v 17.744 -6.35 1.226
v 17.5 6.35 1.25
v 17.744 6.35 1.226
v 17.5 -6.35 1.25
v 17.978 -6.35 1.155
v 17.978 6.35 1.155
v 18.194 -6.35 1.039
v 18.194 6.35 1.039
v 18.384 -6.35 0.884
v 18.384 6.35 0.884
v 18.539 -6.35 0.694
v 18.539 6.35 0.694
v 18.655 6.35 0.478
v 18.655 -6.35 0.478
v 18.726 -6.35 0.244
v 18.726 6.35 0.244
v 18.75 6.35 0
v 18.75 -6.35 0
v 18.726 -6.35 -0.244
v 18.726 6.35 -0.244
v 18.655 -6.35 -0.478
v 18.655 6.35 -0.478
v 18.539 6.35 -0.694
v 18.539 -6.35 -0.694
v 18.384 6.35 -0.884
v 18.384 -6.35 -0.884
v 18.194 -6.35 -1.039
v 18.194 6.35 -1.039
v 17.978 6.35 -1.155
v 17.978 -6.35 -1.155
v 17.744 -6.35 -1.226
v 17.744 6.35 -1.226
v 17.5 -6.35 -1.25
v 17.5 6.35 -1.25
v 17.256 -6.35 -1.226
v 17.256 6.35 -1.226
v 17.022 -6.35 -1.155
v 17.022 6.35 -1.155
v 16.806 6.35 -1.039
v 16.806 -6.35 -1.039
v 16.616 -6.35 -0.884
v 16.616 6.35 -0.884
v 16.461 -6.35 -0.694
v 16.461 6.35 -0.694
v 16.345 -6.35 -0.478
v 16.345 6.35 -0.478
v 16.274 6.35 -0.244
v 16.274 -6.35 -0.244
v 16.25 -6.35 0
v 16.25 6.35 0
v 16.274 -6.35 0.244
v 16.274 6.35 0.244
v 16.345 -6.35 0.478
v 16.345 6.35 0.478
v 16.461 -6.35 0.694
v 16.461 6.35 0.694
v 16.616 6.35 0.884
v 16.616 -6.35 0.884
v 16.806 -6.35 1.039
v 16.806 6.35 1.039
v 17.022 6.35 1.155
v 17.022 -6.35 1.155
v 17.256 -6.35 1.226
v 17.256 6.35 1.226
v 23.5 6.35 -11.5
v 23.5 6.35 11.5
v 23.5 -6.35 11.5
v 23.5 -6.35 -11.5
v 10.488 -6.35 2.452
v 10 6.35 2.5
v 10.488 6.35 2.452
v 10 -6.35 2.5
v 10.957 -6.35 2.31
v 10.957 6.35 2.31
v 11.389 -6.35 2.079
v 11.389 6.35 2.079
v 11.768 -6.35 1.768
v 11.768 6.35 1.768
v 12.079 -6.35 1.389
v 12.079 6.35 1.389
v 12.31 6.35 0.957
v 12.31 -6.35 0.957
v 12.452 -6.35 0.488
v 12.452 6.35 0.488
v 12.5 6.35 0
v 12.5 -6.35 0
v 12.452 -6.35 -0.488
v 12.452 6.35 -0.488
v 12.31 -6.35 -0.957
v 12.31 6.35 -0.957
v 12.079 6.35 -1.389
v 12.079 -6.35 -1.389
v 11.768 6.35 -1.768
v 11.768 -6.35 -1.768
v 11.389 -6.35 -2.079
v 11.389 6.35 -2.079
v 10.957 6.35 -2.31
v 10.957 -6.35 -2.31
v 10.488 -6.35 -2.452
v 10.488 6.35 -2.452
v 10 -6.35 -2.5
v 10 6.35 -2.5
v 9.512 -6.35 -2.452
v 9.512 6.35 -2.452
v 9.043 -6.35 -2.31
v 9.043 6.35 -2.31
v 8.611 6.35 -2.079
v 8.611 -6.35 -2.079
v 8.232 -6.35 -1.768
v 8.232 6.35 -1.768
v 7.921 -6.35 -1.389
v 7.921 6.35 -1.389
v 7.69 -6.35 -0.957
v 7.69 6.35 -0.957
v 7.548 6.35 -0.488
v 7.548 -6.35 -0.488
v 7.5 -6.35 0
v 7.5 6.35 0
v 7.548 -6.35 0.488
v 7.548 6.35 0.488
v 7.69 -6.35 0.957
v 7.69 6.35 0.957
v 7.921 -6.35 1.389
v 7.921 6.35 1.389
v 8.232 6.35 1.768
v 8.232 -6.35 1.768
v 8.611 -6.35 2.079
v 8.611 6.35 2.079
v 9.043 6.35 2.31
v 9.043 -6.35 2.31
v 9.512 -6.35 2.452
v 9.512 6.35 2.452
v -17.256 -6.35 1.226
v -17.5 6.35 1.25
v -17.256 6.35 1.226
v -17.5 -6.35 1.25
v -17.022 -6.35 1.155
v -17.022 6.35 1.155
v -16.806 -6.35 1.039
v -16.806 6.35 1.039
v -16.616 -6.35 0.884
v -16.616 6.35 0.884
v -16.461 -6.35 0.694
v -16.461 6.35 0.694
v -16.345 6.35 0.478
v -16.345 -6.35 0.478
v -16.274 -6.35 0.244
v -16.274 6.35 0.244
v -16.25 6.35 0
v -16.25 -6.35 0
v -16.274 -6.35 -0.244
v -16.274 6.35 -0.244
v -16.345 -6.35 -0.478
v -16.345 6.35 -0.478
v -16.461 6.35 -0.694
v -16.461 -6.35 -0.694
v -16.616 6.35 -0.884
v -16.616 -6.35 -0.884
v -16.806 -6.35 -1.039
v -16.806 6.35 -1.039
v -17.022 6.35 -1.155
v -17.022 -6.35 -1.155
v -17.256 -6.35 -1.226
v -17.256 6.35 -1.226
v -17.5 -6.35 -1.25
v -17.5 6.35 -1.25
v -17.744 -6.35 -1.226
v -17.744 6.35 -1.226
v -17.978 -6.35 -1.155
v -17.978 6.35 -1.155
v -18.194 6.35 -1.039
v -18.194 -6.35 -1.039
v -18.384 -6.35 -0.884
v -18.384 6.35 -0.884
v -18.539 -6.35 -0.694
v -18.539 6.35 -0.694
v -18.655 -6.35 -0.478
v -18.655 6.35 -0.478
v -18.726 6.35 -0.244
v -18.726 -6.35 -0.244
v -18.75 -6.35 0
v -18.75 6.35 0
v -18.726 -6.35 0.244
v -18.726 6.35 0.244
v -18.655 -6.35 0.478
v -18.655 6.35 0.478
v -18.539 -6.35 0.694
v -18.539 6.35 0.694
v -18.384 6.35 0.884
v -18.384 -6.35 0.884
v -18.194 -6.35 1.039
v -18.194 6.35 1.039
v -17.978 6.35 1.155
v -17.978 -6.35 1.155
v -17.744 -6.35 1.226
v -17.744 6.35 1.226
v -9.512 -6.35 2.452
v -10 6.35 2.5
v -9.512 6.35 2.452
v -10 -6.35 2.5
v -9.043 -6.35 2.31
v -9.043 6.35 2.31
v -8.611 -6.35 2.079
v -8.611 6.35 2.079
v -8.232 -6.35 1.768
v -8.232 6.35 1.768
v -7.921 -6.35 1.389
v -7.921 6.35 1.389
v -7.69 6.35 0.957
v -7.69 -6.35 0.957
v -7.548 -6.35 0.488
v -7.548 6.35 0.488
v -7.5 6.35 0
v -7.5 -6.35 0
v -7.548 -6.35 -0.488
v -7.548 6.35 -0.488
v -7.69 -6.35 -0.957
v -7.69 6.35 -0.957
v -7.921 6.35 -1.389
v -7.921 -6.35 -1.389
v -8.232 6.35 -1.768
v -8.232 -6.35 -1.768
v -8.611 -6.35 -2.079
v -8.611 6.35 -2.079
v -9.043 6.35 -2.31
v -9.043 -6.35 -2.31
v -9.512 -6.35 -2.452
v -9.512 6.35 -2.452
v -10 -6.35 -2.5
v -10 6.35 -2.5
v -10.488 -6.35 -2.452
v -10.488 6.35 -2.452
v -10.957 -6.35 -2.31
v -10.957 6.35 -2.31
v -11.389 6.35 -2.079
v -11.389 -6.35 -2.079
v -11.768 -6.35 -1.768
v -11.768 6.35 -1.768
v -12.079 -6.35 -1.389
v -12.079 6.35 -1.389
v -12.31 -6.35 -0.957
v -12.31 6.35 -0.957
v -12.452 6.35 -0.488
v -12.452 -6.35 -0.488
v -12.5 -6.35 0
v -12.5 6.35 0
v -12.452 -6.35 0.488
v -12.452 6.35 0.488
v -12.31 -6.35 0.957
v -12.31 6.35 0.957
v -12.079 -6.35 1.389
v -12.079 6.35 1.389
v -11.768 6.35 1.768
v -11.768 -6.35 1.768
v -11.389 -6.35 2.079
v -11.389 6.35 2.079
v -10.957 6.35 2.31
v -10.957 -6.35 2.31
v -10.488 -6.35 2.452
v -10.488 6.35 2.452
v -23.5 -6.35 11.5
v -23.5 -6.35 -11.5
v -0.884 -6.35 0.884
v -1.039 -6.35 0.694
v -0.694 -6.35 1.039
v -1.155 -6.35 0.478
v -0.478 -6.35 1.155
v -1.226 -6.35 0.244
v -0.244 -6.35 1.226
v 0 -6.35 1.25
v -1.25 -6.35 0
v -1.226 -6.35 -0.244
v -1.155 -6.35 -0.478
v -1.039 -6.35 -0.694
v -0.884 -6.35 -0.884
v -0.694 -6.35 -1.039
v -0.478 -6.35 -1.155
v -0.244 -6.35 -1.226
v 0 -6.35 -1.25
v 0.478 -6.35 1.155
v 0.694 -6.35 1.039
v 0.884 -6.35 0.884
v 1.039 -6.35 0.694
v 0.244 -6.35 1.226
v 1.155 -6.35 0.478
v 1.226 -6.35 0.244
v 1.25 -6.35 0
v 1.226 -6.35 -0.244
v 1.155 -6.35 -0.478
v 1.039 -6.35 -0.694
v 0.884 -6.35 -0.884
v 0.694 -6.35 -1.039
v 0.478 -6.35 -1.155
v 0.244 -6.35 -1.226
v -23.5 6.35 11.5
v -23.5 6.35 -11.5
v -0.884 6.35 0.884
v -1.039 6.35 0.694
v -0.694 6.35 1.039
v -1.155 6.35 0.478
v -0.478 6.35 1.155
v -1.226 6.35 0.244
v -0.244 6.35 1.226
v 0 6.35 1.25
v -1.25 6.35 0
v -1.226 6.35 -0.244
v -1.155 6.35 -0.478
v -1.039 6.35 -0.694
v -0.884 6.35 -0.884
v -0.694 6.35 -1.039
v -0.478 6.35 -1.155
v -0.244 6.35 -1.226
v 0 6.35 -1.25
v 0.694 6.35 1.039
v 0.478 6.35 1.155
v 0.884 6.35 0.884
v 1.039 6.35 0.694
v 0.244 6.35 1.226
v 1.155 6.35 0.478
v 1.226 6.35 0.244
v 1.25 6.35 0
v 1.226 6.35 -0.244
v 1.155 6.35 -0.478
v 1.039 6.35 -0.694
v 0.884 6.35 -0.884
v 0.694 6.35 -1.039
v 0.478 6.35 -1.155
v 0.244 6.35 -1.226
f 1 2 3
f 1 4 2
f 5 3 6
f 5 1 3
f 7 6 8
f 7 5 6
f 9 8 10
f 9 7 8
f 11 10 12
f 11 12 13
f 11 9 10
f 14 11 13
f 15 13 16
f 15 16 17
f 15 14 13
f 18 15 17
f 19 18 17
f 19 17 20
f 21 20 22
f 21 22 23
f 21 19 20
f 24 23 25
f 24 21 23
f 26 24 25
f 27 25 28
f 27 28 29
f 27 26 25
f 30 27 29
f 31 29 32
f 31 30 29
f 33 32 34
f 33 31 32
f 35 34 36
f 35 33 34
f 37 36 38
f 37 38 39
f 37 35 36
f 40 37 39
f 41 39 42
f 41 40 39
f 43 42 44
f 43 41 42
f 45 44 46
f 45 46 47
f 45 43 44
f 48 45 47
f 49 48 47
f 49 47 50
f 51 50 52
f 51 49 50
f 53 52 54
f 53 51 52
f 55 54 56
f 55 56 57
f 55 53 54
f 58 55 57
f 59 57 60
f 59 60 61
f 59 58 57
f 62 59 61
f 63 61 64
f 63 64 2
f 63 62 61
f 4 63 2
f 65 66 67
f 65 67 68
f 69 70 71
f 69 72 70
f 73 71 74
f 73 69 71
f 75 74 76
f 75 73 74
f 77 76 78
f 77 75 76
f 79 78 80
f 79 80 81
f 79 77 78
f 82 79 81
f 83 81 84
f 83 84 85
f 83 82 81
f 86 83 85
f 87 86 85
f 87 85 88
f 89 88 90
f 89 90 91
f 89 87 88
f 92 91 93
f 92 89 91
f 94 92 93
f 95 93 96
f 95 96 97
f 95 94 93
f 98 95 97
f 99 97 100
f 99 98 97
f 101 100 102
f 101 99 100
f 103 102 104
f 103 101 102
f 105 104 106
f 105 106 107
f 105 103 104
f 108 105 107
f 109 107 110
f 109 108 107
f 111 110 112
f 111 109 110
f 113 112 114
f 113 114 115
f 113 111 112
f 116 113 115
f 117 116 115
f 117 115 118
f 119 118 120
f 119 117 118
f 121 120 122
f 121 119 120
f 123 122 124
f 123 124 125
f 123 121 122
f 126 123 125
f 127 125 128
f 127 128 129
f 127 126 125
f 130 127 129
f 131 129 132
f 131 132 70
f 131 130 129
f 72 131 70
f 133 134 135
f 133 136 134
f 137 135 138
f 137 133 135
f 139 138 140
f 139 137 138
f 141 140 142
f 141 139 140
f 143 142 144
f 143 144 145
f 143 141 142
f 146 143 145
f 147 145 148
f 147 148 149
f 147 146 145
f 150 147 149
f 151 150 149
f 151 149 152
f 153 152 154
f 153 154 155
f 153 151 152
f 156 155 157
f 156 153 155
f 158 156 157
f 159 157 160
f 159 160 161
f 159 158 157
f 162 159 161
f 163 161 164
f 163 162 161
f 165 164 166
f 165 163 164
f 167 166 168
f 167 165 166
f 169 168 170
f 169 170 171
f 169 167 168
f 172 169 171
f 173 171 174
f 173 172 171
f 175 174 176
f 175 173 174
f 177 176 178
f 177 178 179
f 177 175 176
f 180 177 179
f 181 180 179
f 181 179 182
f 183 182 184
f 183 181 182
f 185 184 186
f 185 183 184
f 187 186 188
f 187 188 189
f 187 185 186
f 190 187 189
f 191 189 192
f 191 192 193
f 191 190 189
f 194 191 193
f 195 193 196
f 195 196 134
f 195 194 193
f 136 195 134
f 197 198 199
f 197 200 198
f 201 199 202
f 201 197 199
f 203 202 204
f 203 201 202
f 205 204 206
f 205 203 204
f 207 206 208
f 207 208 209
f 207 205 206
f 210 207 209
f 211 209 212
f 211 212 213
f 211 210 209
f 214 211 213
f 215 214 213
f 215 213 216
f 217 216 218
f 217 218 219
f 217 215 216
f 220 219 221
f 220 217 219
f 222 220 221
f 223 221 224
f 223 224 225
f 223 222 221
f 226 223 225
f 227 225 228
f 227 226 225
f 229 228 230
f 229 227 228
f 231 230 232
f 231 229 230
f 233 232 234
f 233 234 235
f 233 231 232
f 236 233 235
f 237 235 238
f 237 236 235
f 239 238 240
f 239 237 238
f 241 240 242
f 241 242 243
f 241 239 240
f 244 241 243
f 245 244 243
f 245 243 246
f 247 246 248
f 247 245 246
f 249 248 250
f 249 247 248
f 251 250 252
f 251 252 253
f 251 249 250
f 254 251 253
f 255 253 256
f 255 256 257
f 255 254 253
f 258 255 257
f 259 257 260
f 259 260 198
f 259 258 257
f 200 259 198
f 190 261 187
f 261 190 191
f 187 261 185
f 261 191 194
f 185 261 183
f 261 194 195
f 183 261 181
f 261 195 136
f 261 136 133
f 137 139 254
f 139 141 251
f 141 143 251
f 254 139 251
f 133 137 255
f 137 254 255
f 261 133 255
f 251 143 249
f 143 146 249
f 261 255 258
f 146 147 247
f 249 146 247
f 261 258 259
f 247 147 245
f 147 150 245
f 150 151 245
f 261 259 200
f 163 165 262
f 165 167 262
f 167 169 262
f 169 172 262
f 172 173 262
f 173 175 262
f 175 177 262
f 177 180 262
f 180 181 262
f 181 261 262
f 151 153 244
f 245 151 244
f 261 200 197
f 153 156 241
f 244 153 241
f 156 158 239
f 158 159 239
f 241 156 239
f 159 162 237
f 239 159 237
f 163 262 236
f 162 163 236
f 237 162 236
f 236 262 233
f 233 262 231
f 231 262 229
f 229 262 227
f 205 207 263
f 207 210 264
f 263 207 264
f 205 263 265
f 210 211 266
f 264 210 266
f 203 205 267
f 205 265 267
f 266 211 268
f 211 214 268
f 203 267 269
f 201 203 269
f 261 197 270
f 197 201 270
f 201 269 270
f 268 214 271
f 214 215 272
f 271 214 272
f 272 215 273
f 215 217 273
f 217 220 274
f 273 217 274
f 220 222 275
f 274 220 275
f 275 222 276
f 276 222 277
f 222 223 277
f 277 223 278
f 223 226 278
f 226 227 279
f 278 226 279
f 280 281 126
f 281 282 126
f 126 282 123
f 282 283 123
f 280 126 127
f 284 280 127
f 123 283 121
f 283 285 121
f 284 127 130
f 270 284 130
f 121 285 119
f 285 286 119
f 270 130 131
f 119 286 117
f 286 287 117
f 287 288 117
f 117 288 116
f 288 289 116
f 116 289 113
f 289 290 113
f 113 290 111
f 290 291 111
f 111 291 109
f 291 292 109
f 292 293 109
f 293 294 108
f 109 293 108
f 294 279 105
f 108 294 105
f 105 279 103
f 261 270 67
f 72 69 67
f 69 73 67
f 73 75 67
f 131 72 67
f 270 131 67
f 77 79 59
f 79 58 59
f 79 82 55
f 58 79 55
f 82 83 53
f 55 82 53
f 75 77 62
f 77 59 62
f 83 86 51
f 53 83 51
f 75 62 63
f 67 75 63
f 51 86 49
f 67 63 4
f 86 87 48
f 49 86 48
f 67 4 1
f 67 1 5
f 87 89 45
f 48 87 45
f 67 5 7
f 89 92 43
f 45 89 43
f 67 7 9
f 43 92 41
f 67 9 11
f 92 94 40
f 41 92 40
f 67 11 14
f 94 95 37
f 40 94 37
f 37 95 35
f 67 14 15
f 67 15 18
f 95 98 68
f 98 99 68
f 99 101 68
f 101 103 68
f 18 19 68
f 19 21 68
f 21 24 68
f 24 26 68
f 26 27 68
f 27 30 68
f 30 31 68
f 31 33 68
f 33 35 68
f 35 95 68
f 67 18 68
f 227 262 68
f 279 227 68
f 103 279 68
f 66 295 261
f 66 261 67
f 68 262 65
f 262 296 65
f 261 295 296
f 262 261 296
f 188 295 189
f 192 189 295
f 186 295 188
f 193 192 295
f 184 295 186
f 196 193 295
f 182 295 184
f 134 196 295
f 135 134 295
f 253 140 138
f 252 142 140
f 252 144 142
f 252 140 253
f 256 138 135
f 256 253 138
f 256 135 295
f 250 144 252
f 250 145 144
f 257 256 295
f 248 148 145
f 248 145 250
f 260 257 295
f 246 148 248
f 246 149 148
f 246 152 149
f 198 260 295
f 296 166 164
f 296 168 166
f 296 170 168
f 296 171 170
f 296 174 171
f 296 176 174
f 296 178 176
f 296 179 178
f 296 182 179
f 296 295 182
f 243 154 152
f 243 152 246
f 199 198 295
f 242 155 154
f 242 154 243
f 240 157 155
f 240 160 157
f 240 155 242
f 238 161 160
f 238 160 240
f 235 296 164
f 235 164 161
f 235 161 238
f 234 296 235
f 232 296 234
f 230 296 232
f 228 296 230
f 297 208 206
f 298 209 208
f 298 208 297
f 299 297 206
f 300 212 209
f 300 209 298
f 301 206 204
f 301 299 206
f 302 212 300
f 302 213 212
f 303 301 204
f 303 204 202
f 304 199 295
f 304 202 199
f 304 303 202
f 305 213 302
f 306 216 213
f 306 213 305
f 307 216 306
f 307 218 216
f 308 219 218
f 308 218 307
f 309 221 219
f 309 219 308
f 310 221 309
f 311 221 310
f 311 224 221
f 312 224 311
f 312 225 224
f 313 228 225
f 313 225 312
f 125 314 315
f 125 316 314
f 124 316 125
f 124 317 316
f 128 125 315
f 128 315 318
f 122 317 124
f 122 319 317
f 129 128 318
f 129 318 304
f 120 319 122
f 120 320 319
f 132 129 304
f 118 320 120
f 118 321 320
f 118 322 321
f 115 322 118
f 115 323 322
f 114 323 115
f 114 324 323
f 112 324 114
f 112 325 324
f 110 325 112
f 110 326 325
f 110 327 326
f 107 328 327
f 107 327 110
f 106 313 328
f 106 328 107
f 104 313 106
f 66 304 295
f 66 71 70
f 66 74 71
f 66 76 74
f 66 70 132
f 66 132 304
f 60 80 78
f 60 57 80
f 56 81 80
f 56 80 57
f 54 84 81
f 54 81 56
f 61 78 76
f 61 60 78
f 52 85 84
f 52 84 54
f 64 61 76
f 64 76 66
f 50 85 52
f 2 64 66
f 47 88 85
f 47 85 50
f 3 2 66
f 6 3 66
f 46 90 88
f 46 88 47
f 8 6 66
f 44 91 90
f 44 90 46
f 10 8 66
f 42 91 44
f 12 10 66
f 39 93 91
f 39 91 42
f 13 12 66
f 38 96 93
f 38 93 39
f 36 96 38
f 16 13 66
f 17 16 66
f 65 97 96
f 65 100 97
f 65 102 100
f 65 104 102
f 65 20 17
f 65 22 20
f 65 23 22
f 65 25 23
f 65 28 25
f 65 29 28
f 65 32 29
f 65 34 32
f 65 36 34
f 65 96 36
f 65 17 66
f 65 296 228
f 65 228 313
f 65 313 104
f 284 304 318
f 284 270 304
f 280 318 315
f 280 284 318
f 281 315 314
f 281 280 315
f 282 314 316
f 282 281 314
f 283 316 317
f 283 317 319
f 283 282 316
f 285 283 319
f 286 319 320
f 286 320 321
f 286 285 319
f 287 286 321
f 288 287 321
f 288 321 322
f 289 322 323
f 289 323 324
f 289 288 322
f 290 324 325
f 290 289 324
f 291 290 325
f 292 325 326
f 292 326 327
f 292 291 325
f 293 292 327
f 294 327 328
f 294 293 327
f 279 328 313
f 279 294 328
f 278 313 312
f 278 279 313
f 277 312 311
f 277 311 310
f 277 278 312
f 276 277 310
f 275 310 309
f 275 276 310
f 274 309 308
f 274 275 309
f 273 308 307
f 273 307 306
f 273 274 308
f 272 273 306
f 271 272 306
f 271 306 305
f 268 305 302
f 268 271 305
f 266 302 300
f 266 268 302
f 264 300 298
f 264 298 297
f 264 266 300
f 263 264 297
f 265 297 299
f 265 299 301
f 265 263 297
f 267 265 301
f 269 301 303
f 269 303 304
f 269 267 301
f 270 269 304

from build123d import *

# Parameters (mm, degrees)
SKETCH1_W           = 47
SKETCH1_H           = 23
SKETCH1_R           = 2.5
SKETCH1_R_2         = 1.25
BOSS_EXTRUDE1_DEPTH = 6.35


with BuildPart() as part:
    # Sketch1 → Boss-Extrude1 (new, symmetric)
    with BuildSketch(Plane(origin=(0, 0, 0), x_dir=(1, 0, 0), z_dir=(0, 1, 0))):
        Rectangle(SKETCH1_W, SKETCH1_H)
        with Locations(Location((-10, 0, 0), (0, 0, 270))):
            Circle(SKETCH1_R, mode=Mode.SUBTRACT)
        with Locations(Location((10, 0, 0), (0, 0, 270))):
            Circle(SKETCH1_R, mode=Mode.SUBTRACT)
        with Locations(Location((17.5, 0, 0), (0, 0, 270))):
            Circle(SKETCH1_R_2, mode=Mode.SUBTRACT)
        with Locations(Location((0, 0, 0), (0, 0, 270))):
            Circle(SKETCH1_R_2, mode=Mode.SUBTRACT)
        with Locations(Location((-17.5, 0, 0), (0, 0, 270))):
            Circle(SKETCH1_R_2, mode=Mode.SUBTRACT)
    extrude(amount=BOSS_EXTRUDE1_DEPTH, both=True)


solid = part.part
